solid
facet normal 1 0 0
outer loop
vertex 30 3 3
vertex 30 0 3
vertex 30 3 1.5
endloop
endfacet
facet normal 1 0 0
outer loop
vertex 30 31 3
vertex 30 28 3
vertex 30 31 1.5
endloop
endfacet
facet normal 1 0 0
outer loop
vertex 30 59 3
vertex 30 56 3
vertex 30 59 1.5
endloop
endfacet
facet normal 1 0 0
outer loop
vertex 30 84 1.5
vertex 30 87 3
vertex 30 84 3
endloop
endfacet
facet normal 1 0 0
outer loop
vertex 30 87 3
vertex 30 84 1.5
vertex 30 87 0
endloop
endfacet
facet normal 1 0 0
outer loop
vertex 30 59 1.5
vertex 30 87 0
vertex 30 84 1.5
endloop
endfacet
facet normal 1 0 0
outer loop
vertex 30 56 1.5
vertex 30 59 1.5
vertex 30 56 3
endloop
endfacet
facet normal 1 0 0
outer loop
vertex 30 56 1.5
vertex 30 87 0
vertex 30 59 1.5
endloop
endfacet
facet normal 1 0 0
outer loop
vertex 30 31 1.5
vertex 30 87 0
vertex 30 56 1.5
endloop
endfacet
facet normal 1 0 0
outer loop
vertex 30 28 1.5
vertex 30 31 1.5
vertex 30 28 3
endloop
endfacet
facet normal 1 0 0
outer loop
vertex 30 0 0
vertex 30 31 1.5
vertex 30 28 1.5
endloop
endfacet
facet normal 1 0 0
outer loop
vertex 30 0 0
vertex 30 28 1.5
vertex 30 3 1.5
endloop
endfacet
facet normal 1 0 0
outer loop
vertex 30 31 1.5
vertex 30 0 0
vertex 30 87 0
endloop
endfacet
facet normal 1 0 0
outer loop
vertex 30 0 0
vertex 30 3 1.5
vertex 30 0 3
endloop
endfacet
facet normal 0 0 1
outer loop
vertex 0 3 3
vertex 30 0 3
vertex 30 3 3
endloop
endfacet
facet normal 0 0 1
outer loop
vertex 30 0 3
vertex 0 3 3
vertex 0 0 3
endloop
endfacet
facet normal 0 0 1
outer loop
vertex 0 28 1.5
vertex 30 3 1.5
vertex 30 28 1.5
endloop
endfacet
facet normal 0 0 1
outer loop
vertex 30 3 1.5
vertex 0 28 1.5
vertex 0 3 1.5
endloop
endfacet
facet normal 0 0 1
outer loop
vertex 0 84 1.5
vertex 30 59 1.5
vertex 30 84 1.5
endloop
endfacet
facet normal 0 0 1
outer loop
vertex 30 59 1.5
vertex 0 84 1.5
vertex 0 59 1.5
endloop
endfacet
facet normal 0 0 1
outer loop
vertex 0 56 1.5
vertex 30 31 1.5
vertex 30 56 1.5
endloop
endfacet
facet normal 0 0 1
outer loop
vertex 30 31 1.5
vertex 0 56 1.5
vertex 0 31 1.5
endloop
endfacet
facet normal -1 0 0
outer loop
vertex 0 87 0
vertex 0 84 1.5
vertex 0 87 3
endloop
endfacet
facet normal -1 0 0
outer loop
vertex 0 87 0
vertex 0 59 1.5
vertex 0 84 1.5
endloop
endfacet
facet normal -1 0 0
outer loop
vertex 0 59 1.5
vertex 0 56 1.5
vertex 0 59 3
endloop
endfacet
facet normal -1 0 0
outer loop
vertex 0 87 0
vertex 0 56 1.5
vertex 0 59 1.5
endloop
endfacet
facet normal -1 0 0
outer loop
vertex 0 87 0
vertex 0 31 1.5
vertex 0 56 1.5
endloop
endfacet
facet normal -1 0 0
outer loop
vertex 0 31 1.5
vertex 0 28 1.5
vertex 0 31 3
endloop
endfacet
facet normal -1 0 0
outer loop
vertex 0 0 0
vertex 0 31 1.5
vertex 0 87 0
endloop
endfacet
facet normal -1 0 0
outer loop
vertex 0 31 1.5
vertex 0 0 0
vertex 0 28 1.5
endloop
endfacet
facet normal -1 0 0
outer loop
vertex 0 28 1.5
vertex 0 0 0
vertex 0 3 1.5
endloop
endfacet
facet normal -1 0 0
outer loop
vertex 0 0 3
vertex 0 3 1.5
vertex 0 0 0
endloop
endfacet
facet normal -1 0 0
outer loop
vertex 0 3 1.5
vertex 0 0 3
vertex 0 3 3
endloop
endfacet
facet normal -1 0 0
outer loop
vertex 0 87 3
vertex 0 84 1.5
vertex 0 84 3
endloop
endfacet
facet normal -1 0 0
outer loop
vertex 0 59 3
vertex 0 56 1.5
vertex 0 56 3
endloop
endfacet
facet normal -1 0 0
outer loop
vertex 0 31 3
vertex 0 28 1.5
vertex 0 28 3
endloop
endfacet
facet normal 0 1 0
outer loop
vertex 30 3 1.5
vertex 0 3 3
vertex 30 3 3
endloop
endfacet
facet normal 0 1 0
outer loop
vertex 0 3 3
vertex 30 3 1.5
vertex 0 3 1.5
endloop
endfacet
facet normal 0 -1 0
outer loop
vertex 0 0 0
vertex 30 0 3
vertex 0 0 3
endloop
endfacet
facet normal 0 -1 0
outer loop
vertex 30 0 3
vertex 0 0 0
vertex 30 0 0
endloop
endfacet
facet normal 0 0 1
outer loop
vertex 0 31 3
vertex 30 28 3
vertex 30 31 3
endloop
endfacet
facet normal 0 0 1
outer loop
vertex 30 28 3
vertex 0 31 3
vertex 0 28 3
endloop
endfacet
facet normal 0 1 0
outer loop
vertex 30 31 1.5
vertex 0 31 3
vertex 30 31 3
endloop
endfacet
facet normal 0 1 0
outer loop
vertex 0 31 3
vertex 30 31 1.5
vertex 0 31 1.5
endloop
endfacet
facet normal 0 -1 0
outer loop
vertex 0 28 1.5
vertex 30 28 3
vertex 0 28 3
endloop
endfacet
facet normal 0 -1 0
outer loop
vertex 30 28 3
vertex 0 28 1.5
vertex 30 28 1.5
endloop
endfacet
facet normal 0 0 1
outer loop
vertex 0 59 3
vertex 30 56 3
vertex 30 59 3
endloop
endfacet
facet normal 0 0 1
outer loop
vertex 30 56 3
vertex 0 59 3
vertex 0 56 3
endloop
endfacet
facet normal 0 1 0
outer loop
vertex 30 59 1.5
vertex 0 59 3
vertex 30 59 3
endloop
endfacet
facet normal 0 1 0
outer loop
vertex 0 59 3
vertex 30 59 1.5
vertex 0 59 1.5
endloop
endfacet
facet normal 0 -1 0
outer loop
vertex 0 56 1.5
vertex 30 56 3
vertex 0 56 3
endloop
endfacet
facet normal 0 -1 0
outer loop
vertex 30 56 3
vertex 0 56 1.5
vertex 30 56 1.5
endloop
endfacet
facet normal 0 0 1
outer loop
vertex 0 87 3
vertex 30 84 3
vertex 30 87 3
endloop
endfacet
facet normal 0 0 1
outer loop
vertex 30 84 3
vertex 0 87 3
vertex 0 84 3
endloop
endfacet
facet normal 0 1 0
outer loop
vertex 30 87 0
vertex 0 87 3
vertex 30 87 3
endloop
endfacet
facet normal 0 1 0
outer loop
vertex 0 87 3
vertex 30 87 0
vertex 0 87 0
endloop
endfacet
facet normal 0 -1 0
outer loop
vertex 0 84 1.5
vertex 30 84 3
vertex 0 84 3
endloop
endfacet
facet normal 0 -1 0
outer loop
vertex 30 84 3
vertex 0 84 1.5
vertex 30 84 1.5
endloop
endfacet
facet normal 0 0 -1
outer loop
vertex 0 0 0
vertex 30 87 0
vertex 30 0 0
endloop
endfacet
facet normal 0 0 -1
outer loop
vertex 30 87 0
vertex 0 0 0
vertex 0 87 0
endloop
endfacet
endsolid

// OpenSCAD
// number of boards
count=3;

// board thickness
board_thickness=25;

// holder width
holder_width=30;

// divider thickness
divider=3;

// height of the holder
holder_height=3;

module board(){

union(){
	cube([holder_width,divider * (count+1) + board_thickness * count,holder_height/2]);
		for (i=[0:count]){
			translate([0,i * (divider + board_thickness), holder_height/2.0]){
				cube([holder_width,divider,holder_height/2.0]);
			}

		}
	}
}

board();
